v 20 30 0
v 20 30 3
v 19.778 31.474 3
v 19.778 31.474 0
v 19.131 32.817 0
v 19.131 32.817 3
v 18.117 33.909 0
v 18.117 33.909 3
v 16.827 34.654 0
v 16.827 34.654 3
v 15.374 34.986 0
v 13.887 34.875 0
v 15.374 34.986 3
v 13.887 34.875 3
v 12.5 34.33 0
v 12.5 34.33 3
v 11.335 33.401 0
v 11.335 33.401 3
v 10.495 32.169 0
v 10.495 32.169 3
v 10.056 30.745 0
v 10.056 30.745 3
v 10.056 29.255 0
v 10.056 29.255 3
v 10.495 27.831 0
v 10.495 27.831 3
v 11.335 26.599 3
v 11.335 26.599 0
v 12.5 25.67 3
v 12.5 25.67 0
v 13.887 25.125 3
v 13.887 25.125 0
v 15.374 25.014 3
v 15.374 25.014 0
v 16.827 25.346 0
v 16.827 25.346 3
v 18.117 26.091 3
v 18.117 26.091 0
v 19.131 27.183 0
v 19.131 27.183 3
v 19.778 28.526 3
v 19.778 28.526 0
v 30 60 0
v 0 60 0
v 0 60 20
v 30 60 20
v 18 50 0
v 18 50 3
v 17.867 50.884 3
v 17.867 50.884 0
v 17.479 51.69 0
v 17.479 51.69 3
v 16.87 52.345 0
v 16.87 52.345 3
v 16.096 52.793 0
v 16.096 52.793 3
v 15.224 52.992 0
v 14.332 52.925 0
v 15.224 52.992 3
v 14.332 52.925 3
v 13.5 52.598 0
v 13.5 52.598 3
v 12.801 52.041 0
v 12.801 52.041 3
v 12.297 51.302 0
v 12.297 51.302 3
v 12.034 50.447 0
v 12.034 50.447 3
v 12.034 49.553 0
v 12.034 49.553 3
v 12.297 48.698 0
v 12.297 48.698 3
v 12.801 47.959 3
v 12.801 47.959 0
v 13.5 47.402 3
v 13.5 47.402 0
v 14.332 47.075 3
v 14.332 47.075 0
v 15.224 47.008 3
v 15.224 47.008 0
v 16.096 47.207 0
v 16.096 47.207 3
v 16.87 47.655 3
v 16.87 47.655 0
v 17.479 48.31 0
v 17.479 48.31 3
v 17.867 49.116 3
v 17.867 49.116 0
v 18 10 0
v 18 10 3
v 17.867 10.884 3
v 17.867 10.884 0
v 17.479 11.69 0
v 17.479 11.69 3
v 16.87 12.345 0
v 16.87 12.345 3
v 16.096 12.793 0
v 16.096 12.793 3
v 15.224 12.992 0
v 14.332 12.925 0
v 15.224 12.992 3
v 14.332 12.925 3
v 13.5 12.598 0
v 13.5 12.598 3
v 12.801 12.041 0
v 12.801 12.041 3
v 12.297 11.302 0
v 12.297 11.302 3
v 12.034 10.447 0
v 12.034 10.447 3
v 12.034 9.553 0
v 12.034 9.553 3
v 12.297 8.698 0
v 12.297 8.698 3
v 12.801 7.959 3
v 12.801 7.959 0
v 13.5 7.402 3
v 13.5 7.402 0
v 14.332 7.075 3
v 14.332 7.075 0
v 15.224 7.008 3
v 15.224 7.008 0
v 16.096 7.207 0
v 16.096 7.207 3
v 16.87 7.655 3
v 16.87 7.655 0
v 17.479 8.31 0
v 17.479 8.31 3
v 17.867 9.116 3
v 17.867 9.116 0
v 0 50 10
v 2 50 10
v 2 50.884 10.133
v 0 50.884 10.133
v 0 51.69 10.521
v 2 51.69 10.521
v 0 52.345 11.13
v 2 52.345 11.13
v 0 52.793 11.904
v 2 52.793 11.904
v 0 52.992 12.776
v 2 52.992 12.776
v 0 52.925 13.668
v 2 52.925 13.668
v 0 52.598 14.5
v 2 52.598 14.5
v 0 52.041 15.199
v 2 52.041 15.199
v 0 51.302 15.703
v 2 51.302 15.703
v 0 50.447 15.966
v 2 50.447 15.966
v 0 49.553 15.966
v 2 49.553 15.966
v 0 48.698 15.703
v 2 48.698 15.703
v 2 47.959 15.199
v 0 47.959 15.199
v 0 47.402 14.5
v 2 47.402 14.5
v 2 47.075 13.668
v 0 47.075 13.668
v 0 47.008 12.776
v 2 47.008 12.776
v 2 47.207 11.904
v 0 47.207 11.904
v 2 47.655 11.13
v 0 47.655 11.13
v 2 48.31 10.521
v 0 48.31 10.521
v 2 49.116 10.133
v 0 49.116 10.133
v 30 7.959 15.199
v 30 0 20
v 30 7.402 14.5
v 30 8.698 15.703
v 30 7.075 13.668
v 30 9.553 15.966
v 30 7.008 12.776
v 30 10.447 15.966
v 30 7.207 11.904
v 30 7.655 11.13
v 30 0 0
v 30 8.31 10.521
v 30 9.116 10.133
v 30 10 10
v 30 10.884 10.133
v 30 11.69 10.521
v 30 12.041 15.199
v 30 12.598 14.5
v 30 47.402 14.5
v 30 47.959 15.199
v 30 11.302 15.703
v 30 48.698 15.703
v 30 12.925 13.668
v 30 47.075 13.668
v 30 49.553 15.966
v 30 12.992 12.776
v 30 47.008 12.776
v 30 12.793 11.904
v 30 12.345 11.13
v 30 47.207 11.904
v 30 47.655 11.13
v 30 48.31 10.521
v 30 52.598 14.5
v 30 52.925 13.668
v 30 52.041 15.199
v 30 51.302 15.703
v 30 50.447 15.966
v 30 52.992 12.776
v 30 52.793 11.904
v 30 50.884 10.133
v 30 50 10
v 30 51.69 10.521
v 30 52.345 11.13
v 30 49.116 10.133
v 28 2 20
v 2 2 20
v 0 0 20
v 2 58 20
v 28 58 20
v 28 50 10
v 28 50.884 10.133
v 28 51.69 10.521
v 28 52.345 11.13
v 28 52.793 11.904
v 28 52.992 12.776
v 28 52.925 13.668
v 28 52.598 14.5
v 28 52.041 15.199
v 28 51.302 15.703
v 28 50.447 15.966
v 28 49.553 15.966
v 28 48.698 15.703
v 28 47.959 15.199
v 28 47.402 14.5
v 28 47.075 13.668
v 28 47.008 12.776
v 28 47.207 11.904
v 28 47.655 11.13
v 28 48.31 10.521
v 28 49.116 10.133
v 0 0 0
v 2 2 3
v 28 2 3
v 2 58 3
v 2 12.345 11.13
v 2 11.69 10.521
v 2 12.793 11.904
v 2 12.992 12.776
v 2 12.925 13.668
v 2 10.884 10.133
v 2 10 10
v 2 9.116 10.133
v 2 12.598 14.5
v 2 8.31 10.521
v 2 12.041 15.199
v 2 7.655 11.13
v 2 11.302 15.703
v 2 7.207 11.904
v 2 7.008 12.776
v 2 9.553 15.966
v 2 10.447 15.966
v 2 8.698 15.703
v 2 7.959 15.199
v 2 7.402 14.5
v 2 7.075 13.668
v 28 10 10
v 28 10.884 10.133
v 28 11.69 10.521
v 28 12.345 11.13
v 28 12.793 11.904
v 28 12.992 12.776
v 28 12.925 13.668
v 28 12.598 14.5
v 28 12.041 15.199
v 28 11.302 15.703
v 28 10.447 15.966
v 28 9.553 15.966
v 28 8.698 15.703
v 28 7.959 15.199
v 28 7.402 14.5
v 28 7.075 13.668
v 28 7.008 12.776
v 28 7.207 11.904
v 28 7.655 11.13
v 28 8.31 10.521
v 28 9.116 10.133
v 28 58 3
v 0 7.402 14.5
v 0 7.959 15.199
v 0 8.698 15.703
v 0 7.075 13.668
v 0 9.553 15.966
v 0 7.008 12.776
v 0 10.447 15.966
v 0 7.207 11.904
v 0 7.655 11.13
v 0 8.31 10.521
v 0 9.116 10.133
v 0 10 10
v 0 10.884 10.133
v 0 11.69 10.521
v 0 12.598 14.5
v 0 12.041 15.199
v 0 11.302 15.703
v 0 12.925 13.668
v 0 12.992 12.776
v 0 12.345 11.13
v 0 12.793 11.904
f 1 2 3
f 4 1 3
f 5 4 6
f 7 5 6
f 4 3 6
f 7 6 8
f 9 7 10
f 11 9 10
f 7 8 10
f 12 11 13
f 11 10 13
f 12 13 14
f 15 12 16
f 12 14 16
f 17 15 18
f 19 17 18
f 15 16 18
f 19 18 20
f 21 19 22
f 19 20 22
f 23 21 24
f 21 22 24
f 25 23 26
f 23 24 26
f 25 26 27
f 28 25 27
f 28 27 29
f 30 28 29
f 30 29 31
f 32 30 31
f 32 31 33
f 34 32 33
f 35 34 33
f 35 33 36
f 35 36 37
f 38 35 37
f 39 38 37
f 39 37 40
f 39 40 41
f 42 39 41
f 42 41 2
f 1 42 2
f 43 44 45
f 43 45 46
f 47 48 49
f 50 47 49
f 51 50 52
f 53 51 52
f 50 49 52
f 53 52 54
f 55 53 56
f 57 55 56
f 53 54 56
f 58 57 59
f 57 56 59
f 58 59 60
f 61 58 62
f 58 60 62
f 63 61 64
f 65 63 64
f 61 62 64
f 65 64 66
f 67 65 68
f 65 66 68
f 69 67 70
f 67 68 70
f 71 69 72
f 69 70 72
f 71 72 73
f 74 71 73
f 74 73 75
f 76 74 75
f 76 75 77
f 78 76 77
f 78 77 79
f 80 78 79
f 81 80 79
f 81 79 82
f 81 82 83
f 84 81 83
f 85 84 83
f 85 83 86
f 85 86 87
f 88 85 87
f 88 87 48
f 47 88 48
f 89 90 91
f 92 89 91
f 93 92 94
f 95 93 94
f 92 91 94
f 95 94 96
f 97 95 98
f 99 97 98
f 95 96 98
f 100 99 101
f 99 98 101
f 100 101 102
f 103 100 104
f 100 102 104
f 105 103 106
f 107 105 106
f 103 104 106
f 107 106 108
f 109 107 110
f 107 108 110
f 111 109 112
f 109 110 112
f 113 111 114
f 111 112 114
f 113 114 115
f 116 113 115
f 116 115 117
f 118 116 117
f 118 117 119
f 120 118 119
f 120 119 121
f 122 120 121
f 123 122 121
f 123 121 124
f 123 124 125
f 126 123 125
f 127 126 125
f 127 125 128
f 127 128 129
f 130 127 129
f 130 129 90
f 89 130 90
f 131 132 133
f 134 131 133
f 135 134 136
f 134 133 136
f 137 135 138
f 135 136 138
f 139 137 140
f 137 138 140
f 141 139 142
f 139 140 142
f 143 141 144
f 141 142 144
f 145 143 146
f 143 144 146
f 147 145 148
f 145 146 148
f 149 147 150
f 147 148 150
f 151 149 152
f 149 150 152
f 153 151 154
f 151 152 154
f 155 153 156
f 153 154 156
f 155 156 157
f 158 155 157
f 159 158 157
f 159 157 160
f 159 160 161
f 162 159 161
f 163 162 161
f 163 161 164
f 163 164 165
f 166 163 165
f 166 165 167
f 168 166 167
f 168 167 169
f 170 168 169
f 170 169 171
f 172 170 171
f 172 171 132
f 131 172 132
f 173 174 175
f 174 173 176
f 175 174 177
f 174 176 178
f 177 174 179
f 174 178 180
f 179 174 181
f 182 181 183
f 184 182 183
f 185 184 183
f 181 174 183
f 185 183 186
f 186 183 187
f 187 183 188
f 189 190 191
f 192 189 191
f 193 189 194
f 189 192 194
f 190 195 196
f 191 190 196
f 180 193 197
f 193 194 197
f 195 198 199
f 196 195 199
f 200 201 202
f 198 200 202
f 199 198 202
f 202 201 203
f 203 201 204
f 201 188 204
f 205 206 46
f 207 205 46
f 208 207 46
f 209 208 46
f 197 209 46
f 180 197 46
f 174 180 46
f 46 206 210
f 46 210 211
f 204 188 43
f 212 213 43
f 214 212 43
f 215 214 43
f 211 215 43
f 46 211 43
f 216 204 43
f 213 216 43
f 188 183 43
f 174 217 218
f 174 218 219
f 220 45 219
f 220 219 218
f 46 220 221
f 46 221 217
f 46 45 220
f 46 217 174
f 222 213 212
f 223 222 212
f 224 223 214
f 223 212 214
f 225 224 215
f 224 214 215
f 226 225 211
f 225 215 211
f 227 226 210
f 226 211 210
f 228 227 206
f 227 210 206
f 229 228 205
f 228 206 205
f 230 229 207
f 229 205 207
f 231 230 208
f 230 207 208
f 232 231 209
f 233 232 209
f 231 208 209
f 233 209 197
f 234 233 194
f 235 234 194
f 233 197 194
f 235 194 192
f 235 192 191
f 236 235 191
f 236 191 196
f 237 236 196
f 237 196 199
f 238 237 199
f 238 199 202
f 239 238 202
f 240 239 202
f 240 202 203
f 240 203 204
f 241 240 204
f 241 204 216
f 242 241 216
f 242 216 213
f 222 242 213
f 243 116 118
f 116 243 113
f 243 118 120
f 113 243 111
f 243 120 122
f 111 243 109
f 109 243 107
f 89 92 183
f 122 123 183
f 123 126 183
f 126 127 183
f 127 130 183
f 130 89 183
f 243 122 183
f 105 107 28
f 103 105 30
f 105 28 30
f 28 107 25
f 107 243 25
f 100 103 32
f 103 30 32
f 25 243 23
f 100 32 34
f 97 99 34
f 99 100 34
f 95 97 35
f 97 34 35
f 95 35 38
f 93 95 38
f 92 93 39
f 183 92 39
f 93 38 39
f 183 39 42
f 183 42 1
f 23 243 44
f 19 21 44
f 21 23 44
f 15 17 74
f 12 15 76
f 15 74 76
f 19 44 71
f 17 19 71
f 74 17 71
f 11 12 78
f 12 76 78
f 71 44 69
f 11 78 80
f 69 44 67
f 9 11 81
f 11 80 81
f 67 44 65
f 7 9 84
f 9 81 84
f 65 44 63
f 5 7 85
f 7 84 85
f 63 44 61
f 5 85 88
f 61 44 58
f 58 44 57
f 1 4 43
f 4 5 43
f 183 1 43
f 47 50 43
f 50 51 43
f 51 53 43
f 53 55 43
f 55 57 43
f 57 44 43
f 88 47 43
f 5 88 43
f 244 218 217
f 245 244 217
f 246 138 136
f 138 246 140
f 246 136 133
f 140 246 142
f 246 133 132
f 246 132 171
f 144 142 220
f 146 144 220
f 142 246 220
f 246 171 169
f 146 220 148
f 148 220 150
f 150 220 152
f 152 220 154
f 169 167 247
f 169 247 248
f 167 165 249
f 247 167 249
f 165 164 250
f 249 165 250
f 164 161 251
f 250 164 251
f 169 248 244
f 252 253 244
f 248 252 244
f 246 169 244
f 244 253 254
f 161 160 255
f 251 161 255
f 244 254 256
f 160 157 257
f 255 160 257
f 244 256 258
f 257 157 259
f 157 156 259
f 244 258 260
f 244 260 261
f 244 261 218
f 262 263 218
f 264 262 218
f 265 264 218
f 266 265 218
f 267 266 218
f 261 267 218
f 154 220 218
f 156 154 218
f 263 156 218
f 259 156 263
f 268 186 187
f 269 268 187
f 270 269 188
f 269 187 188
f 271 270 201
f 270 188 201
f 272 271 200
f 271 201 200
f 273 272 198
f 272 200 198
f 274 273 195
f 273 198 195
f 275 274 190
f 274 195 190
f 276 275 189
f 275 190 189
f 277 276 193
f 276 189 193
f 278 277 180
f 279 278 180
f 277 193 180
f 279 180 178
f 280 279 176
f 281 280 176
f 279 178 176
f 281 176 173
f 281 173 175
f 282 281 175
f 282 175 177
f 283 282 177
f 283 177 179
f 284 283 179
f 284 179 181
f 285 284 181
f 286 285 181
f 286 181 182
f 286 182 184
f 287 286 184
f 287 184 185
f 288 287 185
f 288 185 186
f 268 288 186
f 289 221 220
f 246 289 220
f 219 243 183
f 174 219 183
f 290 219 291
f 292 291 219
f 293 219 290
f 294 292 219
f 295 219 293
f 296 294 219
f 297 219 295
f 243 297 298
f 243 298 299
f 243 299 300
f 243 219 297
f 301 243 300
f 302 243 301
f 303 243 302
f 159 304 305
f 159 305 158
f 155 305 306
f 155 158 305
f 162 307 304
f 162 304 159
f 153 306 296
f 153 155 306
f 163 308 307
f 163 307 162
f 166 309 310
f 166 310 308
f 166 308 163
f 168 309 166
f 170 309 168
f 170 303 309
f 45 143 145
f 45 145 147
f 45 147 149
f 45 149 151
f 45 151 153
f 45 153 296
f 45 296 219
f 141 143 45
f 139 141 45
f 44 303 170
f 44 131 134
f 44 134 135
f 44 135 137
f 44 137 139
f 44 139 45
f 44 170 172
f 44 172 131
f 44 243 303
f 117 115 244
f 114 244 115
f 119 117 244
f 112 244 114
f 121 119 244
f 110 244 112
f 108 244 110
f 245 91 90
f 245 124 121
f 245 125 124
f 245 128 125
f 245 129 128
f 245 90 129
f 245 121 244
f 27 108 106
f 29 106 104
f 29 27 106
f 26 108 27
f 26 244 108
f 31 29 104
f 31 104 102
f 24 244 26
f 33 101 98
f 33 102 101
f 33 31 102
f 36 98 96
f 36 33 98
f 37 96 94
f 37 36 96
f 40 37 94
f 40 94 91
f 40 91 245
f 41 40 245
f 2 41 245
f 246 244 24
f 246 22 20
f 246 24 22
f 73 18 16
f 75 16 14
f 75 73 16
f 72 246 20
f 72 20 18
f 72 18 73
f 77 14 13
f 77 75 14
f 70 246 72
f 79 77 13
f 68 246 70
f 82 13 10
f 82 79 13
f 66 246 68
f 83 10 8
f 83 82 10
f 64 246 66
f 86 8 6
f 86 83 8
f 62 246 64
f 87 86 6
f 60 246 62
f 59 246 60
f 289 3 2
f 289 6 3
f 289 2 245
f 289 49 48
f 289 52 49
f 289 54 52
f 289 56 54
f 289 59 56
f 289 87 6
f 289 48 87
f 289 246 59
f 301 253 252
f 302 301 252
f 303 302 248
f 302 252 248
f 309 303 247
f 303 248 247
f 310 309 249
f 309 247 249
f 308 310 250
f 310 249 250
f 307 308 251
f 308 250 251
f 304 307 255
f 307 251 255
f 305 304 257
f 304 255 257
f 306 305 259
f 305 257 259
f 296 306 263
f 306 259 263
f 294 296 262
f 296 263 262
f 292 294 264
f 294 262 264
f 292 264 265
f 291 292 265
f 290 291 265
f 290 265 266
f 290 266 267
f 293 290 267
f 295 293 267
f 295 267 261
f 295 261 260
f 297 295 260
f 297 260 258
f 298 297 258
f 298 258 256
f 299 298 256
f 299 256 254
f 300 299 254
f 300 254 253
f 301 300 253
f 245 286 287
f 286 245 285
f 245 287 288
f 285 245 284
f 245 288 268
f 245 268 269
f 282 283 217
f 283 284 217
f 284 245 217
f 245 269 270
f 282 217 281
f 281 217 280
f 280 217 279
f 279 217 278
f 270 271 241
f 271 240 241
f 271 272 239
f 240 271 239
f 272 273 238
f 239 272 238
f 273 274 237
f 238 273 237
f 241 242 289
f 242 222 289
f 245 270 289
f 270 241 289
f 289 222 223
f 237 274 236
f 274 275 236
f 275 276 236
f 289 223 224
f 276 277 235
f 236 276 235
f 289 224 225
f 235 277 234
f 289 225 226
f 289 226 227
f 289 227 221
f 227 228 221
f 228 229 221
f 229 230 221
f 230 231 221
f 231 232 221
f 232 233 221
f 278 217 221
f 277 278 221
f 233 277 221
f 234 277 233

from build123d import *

# Parameters (mm, degrees)
ESBO_O1_W                = 30
ESBO_O1_H                = 60
RESSALTO_EXTRUS_O1_DEPTH = 20
CORTE_EXTRUS_O1_DEPTH    = 17
ESBO_O7_R                = 3
ESBO_O7_R_2              = 5
CORTE_EXTRUS_O2_DEPTH    = 17
ESBO_O9_R                = 3
CORTE_EXTRUS_O4_DEPTH    = 71


with BuildPart() as part:
    # Esboço1 → Ressalto-extrusão1 (new body)
    with BuildSketch(Plane.XY):
        with Locations((15, 30)):
            Rectangle(ESBO_O1_W, ESBO_O1_H)
    extrude(amount=RESSALTO_EXTRUS_O1_DEPTH)

    # Esboço6 → Corte-extrusão1 (cut)
    with BuildSketch(Plane.XY.offset(20)):
        Polygon((28, 58), (15, 58), (2, 58), (2, 2), (15, 2), (28, 2), align=None)
    extrude(amount=-CORTE_EXTRUS_O1_DEPTH, mode=Mode.SUBTRACT)

    # Esboço7 → Corte-extrusão2 (cut)
    with BuildSketch(Plane.XY.offset(3)):
        with Locations((15, 10)):
            Circle(ESBO_O7_R)
        with Locations((15, 50)):
            Circle(ESBO_O7_R)
        with Locations((15, 30)):
            Circle(ESBO_O7_R_2)
    extrude(amount=-CORTE_EXTRUS_O2_DEPTH, mode=Mode.SUBTRACT)

    # Esboço9 → Corte-extrusão4 (cut, through all)
    with BuildSketch(Plane(origin=(30, 0, 0), x_dir=(0, 0, -1), z_dir=(1, 0, 0))):
        with Locations((-13, 50)):
            Circle(ESBO_O9_R)
        with Locations((-13, 10)):
            Circle(ESBO_O9_R)
    extrude(amount=-CORTE_EXTRUS_O4_DEPTH, mode=Mode.SUBTRACT)


solid = part.part
